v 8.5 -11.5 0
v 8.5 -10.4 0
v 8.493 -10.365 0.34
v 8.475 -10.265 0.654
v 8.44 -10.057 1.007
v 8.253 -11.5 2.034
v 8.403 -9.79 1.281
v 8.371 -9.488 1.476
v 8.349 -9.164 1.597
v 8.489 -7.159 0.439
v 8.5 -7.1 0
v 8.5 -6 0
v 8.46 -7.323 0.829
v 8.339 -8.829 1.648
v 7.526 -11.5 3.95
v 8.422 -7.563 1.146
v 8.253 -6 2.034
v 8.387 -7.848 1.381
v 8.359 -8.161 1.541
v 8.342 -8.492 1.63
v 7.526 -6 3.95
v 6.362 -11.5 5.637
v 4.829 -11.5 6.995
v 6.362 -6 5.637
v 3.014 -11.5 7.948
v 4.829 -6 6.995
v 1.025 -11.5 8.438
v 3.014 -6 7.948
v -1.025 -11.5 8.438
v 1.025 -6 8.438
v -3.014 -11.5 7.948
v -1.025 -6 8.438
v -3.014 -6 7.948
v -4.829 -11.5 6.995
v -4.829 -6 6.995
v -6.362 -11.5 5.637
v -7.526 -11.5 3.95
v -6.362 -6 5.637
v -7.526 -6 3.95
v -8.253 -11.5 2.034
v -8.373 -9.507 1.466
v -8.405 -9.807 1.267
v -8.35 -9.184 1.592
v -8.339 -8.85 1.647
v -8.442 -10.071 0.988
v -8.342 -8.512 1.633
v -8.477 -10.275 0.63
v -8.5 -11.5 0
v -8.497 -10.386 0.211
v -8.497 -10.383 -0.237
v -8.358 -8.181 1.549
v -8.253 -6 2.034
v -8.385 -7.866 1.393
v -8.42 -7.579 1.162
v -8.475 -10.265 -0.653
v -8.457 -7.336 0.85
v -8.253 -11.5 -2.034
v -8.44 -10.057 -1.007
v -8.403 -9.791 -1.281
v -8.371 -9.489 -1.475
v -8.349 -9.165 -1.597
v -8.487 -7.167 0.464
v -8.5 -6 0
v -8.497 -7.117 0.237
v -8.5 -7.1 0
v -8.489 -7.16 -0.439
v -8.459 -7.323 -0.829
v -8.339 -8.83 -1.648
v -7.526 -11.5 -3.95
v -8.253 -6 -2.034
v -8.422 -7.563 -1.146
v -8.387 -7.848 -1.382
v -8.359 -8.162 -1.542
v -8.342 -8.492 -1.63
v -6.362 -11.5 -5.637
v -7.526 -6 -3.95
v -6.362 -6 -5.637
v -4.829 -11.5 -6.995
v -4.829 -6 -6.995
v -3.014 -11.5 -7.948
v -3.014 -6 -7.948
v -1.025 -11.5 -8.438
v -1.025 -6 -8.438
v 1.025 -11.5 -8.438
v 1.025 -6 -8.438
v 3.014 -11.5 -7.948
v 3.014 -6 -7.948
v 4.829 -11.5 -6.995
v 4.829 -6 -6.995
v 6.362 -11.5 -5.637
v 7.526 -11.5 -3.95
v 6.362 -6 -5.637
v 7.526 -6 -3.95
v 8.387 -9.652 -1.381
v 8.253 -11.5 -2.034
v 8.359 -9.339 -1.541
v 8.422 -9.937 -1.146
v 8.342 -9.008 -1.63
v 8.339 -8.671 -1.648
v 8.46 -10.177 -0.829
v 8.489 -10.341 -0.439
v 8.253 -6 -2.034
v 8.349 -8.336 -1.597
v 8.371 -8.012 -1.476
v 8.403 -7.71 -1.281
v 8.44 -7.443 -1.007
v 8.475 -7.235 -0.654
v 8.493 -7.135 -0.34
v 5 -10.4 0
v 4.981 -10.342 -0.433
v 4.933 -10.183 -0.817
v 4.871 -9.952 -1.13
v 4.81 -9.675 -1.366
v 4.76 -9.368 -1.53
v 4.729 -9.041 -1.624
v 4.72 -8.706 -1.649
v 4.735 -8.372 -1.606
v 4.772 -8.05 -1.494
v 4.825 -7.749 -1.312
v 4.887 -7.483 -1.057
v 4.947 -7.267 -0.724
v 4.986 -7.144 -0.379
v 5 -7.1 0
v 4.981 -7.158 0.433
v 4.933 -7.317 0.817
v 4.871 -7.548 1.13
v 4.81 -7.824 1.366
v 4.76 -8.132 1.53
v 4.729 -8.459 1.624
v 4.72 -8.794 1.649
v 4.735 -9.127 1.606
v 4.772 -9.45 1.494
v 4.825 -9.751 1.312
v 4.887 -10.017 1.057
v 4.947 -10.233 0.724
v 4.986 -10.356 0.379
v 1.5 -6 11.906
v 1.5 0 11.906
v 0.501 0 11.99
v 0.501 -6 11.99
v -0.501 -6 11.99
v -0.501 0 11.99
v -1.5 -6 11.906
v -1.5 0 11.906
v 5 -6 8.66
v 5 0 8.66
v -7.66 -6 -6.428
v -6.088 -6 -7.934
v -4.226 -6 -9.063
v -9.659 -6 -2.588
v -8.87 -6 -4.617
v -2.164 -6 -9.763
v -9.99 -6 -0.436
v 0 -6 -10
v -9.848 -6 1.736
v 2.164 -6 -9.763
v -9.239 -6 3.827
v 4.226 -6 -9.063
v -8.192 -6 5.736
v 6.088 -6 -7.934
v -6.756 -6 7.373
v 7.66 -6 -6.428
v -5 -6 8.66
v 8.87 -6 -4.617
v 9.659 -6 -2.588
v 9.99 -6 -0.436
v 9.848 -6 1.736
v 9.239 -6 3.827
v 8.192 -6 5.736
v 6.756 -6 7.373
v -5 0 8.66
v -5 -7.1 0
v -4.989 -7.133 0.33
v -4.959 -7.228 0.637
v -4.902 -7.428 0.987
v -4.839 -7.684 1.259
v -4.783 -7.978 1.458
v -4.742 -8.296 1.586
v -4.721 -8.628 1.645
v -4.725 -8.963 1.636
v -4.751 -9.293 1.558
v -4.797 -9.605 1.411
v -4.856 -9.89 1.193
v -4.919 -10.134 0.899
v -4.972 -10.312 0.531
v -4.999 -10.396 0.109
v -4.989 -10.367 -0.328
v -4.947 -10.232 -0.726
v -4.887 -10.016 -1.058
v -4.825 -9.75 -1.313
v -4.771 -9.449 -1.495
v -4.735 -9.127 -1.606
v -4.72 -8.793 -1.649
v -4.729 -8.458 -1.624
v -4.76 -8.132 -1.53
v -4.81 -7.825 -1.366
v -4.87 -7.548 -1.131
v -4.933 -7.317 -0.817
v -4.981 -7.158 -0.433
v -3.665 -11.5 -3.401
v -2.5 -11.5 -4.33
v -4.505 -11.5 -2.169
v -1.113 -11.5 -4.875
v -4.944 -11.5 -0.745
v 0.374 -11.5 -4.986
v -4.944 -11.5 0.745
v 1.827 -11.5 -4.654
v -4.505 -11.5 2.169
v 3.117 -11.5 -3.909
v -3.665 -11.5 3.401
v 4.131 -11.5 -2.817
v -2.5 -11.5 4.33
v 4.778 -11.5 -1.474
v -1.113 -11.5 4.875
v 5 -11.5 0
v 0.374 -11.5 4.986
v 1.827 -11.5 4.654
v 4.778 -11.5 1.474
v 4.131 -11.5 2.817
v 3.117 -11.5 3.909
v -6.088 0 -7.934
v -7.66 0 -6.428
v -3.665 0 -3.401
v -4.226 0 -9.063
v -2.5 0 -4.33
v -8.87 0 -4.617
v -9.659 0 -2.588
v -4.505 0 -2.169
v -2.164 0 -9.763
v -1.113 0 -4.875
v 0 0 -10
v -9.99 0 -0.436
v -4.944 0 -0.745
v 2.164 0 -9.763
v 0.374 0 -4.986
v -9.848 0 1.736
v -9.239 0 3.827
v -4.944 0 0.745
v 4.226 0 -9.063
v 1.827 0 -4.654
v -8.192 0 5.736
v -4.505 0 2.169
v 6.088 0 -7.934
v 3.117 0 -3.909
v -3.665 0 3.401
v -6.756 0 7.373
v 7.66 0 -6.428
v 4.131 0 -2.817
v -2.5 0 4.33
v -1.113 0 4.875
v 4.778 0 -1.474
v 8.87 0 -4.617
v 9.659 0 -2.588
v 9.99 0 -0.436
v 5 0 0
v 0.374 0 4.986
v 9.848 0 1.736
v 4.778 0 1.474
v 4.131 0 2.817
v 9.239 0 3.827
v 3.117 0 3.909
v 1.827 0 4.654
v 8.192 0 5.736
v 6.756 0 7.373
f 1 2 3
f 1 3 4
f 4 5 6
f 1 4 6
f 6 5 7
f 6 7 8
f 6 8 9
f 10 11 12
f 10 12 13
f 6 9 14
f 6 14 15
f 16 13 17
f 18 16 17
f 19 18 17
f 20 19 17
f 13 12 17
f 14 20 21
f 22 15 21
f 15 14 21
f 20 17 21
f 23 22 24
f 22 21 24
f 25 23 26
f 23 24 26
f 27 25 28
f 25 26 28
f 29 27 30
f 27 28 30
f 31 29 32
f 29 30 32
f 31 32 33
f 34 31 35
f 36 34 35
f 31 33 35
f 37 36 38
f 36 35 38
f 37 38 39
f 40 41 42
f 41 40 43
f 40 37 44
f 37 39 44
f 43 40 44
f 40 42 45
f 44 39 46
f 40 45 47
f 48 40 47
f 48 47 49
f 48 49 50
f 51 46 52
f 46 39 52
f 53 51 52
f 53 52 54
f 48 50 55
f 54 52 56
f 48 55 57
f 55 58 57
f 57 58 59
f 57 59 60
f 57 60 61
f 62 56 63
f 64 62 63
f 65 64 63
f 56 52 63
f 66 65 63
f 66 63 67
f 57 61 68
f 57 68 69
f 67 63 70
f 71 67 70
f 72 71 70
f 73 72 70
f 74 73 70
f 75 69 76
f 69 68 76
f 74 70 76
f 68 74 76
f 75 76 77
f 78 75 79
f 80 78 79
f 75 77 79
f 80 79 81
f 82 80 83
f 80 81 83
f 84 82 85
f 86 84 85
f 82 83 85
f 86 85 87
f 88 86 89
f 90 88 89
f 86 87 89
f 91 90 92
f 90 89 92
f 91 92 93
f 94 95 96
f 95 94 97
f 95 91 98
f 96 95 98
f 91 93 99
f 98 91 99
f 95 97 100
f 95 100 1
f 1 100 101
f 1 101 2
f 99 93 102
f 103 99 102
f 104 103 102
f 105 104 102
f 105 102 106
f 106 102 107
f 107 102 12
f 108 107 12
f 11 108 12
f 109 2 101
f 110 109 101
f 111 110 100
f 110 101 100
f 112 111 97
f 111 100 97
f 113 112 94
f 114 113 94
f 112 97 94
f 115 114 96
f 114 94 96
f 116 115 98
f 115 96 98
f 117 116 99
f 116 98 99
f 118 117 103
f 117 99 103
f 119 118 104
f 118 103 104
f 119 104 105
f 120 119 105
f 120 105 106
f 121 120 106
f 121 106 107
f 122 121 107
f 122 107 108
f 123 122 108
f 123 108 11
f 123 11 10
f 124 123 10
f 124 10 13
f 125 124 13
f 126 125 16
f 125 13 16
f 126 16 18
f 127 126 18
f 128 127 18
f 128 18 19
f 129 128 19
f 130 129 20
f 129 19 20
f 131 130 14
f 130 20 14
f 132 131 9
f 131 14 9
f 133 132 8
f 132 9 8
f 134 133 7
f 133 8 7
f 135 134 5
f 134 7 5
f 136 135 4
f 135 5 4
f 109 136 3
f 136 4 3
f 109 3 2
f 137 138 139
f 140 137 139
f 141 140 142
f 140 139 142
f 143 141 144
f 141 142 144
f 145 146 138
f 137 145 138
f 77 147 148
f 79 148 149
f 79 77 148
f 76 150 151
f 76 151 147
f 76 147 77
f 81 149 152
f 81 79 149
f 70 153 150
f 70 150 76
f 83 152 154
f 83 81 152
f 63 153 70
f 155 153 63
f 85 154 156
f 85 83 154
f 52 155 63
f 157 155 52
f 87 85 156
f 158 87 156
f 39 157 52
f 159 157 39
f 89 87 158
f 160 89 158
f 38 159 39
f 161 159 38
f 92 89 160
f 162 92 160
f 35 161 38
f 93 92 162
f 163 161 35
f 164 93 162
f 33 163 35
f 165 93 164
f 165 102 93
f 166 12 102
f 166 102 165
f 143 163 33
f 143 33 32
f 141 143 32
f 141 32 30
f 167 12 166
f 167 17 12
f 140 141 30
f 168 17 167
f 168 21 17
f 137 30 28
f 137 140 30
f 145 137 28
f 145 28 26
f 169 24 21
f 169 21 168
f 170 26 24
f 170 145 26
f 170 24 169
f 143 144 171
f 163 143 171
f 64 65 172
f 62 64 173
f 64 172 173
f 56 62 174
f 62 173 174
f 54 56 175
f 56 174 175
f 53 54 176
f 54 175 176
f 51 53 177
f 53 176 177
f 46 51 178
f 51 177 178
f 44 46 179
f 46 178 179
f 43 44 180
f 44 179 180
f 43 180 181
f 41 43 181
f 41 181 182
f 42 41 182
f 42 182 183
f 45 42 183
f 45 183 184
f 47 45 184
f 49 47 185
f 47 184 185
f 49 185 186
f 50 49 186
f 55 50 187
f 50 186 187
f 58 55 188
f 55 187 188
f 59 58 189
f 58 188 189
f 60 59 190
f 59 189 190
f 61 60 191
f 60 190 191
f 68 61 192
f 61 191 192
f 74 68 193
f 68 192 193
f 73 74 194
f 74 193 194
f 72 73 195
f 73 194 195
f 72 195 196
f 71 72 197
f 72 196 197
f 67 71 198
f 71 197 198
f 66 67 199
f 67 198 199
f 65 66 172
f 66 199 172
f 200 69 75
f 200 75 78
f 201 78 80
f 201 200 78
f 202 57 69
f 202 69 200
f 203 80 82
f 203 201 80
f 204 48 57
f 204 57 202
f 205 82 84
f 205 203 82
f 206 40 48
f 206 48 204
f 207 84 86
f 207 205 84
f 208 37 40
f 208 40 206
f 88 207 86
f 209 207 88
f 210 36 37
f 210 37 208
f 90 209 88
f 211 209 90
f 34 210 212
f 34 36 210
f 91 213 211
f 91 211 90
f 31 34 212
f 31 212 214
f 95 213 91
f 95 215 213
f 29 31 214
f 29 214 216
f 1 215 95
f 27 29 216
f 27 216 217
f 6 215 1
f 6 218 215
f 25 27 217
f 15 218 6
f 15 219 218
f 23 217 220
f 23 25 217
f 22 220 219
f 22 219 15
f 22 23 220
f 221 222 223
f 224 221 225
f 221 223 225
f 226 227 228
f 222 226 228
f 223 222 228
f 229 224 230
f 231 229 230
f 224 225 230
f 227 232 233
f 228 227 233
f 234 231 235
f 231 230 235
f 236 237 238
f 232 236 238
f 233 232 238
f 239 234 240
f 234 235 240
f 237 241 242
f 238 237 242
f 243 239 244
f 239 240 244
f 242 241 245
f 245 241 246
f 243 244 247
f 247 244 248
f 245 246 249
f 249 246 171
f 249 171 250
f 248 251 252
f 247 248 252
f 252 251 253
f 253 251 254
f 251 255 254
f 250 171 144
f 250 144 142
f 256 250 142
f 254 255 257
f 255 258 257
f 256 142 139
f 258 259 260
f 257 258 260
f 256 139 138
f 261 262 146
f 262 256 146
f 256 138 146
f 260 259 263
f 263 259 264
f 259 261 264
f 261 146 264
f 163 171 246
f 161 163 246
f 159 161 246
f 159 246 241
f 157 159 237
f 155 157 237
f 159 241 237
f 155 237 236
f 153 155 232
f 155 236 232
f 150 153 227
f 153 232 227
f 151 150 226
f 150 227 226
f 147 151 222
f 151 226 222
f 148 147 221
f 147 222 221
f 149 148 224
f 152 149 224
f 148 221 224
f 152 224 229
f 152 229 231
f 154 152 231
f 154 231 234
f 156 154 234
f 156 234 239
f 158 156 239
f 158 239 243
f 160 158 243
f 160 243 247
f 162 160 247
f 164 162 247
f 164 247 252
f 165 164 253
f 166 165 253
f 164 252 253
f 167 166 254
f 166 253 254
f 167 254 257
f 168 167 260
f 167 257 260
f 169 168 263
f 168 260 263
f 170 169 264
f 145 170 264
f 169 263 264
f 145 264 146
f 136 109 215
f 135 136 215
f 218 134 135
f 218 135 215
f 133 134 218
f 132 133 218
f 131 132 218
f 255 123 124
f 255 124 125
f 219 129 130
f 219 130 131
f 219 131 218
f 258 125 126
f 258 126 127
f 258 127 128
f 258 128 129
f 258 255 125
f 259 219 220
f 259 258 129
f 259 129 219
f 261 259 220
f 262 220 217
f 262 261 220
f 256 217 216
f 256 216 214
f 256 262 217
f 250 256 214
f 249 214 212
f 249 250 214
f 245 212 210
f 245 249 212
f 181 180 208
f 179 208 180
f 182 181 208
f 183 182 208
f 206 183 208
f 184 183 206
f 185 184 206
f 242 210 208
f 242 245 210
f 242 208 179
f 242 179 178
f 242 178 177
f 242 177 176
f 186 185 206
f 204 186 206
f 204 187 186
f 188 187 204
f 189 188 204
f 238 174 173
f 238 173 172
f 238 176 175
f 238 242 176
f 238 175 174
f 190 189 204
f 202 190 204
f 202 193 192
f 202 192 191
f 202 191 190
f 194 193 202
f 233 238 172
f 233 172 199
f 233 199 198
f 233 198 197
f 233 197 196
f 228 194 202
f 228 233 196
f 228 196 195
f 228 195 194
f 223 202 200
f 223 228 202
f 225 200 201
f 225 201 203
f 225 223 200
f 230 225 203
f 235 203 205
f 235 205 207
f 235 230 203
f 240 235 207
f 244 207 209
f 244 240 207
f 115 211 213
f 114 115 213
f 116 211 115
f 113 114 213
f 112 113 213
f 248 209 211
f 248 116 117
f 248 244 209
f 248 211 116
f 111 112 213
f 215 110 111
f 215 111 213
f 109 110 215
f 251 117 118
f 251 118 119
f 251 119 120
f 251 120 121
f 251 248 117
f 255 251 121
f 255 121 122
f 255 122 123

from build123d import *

# Parameters (mm, degrees)
F0_R     = 8.5
F0_R_2   = 5
F1_DEPTH = 6
F2_DEPTH = 11.5
F4_D     = 3.3
F4_DEPTH = 10.001
F5_D     = 3.3


with BuildPart() as f1:
    # F0 (on Front) → F1 (new body)
    with BuildSketch(Plane.XZ):
        with BuildLine():
            Line((-1.5, 11.9058808998), (-5, 8.6602540378))
            ThreePointArc((-5, 8.6602540378), (0, -10), (5, 8.6602540378))
            Line((5, 8.6602540378), (1.5, 11.9058808998))
            ThreePointArc((1.5, 11.9058808998), (0, 12), (-1.5, 11.9058808998))
        make_face()
        Circle(F0_R, mode=Mode.SUBTRACT)
        Circle(F0_R)
        Circle(F0_R_2, mode=Mode.SUBTRACT)
    extrude(amount=F1_DEPTH)

    # F0 (on Front) → F2 (join)
    with BuildSketch(Plane.XZ):
        Circle(F0_R)
        Circle(F0_R_2, mode=Mode.SUBTRACT)
    extrude(amount=F2_DEPTH)

    # F4 (through all, one way)
    with BuildSketch(Plane.YZ):
        with Locations((-8.75, 0)):
            Circle(F4_D / 2)
    extrude(amount=-F4_DEPTH, mode=Mode.SUBTRACT)

    # F5 (through all)
    with Locations(Plane(origin=(0, 0, 0), x_dir=(0, 1, 0), z_dir=(-1, 0, 0))):
        with Locations((-8.75, 0)):
            Hole(F5_D / 2)


solid = f1.part
